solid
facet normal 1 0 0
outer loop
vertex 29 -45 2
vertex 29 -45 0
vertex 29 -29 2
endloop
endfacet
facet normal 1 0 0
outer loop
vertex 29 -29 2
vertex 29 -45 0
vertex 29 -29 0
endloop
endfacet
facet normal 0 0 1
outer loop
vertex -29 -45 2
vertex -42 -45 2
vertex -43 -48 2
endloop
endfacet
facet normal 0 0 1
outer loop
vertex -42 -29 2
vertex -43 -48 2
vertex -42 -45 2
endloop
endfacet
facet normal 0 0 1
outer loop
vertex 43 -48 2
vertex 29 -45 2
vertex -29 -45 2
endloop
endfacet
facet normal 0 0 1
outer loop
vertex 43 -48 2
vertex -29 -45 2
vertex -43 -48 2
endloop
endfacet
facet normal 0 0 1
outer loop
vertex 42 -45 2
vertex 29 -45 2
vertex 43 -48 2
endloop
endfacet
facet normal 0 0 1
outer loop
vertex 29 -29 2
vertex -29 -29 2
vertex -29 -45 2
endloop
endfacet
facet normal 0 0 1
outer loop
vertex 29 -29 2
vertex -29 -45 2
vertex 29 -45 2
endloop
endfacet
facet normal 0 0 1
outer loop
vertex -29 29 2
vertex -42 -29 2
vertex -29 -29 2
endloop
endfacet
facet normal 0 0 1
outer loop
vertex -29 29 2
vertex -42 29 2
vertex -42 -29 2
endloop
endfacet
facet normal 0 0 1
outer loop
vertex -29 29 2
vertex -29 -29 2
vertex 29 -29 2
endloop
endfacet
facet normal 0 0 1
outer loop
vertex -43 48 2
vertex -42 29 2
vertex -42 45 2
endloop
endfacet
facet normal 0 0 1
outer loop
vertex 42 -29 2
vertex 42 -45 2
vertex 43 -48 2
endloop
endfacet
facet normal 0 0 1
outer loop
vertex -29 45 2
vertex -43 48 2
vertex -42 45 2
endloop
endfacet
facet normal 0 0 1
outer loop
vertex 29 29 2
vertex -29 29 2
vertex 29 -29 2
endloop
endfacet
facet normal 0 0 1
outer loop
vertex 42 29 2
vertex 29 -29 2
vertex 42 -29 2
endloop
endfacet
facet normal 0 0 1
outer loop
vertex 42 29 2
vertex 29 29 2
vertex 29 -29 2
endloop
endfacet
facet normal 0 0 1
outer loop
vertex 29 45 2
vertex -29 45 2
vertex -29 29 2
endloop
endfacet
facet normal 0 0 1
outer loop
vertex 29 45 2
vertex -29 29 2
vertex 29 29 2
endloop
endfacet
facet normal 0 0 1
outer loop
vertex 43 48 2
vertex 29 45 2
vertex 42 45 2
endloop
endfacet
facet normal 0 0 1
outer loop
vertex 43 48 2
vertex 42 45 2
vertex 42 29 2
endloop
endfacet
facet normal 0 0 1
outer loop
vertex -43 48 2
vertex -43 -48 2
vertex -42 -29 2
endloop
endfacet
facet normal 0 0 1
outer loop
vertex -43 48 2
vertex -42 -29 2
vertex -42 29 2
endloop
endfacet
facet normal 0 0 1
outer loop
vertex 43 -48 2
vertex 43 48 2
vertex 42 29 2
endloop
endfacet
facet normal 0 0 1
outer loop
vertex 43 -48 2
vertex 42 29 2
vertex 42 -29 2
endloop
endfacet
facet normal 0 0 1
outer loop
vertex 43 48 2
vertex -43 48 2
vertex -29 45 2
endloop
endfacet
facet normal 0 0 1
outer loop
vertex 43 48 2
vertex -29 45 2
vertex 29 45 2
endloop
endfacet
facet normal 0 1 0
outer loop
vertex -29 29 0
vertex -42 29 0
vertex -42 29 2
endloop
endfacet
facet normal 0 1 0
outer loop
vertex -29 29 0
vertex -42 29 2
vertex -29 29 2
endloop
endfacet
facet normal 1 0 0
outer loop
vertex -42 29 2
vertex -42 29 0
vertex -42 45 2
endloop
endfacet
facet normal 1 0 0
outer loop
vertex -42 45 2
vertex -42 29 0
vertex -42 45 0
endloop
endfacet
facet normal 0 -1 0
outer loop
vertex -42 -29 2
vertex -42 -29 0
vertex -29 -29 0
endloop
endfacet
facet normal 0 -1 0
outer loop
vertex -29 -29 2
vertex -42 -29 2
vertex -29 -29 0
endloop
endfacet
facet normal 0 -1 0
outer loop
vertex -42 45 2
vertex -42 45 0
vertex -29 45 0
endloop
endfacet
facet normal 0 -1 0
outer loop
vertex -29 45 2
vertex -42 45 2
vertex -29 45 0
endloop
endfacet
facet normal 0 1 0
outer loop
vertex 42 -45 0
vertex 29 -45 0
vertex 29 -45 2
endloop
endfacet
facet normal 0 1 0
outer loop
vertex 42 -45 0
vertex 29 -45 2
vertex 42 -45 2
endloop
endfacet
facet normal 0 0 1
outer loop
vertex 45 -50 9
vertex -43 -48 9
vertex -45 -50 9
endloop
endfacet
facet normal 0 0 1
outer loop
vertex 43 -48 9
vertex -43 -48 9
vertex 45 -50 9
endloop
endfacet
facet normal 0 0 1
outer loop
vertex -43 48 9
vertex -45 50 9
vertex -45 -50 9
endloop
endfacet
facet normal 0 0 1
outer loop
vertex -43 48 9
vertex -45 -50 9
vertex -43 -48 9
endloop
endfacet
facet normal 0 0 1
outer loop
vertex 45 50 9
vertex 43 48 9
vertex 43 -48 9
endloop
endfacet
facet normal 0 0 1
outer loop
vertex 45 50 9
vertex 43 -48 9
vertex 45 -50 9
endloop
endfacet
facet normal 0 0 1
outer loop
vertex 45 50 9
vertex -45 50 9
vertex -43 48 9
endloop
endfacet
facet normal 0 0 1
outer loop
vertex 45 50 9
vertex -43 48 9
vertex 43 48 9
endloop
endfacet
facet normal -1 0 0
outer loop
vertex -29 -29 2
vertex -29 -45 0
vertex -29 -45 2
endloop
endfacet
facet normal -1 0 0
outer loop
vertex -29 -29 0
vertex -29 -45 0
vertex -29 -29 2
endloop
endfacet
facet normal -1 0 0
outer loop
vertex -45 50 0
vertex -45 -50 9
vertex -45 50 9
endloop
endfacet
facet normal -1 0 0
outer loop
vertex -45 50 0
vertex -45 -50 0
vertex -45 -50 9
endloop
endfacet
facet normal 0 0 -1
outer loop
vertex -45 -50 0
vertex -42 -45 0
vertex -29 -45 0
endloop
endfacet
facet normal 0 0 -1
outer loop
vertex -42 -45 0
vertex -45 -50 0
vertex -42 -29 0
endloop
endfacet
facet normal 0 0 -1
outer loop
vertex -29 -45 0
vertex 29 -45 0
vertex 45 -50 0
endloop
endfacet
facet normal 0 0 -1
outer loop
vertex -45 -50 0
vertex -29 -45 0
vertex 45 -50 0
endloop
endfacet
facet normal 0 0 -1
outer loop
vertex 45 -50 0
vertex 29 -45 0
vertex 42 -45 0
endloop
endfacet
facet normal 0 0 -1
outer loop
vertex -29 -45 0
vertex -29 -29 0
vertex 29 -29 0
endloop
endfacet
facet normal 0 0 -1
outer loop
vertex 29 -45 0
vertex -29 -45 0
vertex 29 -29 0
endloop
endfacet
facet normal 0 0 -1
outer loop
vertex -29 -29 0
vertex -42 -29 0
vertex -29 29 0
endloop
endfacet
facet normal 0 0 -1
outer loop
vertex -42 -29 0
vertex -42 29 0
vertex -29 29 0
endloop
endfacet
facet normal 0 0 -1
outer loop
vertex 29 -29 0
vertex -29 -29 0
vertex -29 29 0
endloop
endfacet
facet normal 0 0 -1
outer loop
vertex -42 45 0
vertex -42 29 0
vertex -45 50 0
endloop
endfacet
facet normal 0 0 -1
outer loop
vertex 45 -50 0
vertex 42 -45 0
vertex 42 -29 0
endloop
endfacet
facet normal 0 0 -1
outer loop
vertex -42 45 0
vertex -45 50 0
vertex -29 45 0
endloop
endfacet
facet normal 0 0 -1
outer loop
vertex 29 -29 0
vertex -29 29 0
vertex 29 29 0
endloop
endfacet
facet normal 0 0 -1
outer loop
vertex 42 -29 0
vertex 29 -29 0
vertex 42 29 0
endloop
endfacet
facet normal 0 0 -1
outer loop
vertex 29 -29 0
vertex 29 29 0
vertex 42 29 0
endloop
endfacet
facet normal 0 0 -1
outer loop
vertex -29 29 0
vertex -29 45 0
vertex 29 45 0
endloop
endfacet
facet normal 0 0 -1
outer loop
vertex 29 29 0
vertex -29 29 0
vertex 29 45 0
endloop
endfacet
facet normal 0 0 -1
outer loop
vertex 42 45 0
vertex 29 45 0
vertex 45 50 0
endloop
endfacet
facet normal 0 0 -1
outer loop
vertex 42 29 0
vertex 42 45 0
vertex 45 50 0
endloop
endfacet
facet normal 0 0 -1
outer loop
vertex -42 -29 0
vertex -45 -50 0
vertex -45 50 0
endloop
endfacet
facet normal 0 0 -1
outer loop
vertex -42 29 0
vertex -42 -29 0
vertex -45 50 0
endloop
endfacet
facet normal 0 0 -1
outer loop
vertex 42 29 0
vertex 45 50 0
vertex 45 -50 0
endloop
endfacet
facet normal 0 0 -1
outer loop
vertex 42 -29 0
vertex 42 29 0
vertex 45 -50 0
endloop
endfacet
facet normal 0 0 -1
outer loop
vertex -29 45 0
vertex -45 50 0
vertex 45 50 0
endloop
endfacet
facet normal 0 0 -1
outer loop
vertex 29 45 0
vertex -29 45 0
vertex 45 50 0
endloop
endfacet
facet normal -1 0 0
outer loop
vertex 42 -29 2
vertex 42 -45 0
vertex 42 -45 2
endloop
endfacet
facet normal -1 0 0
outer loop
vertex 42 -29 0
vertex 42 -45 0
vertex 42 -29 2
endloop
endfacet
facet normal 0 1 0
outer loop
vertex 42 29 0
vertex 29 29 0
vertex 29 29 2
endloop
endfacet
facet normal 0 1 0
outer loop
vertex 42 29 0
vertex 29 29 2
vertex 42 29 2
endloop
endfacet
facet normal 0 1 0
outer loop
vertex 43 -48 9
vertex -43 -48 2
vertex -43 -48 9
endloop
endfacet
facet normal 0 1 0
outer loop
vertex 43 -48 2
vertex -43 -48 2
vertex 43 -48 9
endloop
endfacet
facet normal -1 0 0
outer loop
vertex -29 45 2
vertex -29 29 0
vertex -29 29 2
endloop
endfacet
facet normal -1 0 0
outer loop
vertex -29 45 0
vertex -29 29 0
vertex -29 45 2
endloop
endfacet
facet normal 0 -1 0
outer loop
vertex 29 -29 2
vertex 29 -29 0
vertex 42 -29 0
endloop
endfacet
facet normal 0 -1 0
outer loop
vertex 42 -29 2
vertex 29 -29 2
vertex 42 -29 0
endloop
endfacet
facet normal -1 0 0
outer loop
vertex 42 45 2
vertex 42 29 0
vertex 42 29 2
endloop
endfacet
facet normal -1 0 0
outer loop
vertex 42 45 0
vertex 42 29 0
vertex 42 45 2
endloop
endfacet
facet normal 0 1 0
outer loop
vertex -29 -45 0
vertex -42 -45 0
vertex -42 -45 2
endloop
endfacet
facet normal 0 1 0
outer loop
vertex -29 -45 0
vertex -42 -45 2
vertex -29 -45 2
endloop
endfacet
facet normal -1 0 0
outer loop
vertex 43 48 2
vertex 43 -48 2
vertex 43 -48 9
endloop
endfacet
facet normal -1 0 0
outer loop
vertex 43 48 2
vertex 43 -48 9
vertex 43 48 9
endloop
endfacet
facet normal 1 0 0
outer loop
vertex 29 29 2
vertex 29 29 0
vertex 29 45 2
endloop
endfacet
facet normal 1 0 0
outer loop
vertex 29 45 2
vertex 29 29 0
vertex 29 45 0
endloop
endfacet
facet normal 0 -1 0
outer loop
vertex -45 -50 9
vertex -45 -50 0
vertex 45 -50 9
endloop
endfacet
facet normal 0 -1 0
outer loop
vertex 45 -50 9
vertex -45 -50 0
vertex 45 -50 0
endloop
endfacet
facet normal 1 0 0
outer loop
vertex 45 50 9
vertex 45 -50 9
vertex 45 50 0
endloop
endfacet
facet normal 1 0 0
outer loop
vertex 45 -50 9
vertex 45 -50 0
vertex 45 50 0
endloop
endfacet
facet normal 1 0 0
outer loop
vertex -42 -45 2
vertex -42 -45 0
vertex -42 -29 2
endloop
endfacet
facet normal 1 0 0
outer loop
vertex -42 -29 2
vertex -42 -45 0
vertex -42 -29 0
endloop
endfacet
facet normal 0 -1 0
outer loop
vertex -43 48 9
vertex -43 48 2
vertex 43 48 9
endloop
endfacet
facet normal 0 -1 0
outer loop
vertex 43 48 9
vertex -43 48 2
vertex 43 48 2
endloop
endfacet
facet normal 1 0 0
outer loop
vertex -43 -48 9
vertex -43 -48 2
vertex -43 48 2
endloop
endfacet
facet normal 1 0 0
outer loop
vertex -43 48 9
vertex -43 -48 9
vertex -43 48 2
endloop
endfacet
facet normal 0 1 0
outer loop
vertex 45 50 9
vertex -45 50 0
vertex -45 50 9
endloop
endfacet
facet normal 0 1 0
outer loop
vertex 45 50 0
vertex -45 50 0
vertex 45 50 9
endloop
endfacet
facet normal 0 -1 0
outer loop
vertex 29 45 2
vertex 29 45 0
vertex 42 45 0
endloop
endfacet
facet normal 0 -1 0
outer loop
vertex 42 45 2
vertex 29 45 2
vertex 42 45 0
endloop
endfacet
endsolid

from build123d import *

# Parameters (mm, degrees)
ESBO_O1_W                = 90
ESBO_O1_H                = 100
ESBO_O1_W_2              = 13
ESBO_O1_H_2              = 16
RESSALTO_EXTRUS_O1_DEPTH = 2
ESBO_O2_W                = 90
ESBO_O2_H                = 100
ESBO_O2_W_2              = 86
ESBO_O2_H_2              = 96
RESSALTO_EXTRUS_O2_DEPTH = 7


with BuildPart() as part:
    # Esboço1 → Ressalto-extrusão1 (new body)
    with BuildSketch(Plane.XY):
        Rectangle(ESBO_O1_W, ESBO_O1_H)
        with Locations((35.5, 37)):
            Rectangle(ESBO_O1_W_2, ESBO_O1_H_2, mode=Mode.SUBTRACT)
        with Locations((35.5, -37)):
            Rectangle(ESBO_O1_W_2, ESBO_O1_H_2, mode=Mode.SUBTRACT)
        with Locations((-35.5, -37)):
            Rectangle(ESBO_O1_W_2, ESBO_O1_H_2, mode=Mode.SUBTRACT)
        with Locations((-35.5, 37)):
            Rectangle(ESBO_O1_W_2, ESBO_O1_H_2, mode=Mode.SUBTRACT)
    extrude(amount=RESSALTO_EXTRUS_O1_DEPTH)

    # Esboço2 → Ressalto-extrusão2 (add)
    with BuildSketch(Plane.XY.offset(2)):
        Rectangle(ESBO_O2_W, ESBO_O2_H)
        Rectangle(ESBO_O2_W_2, ESBO_O2_H_2, mode=Mode.SUBTRACT)
    extrude(amount=RESSALTO_EXTRUS_O2_DEPTH)


solid = part.part
